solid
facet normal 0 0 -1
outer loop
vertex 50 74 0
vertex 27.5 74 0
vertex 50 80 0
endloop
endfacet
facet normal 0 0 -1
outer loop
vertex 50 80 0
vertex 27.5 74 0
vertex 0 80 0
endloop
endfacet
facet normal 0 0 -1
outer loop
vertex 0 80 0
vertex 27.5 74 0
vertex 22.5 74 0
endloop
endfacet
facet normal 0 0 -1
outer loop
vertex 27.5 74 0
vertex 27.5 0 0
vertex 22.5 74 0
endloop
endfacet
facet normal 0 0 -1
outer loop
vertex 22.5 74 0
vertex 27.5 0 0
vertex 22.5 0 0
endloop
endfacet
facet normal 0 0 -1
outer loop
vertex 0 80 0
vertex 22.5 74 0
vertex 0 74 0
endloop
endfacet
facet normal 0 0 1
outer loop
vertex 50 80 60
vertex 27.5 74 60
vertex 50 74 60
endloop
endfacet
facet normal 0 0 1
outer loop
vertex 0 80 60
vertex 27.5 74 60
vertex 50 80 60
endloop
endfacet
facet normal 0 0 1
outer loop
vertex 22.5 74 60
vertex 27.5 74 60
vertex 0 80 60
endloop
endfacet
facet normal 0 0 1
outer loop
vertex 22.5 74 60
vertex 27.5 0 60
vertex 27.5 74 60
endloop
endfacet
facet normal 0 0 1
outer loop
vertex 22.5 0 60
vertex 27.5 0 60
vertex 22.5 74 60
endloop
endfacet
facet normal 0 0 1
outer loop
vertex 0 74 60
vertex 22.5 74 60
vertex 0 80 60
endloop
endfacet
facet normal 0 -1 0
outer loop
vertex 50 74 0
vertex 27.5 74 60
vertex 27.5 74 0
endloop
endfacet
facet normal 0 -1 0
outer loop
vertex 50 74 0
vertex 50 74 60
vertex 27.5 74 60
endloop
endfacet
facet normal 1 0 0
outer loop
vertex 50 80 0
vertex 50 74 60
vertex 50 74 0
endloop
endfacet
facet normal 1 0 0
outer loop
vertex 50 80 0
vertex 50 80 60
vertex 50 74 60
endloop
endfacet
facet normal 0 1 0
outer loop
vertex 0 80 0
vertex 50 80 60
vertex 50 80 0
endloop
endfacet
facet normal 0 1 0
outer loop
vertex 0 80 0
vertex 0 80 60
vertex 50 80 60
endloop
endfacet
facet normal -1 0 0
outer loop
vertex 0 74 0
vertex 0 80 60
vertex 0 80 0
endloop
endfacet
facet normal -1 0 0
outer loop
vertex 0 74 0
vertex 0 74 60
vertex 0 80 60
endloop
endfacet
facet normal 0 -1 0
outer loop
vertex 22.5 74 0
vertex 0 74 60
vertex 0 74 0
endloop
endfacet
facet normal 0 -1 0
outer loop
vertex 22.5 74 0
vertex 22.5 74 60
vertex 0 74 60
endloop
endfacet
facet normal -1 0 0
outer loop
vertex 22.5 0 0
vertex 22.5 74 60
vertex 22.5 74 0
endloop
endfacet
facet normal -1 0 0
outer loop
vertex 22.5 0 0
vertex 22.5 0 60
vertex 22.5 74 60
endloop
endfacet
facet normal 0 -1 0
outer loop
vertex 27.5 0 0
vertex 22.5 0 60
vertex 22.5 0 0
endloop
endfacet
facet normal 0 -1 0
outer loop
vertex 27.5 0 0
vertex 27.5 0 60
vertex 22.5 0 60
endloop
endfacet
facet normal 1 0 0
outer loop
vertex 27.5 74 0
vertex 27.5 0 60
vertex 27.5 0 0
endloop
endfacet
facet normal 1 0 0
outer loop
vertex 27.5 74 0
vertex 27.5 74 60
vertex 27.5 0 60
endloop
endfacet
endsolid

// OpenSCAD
$fn = 32;

// ----------------------------------------------------------------------
// Structural section: tee 50 x 80 mm
// ----------------------------------------------------------------------

// --- parameters (mm) ---
sec_w = 50;               // tee width, X
sec_h = 80;               // tee height, Y
flange_t = 6;             // top flange thickness
web_t = 5;                // web thickness
plate_t = 60;             // cut length, Z (extrusion height)

profile = [[22.5, 0], [27.5, 0], [27.5, 74], [50, 74], [50, 80], [0, 80], [0, 74], [22.5, 74]];  // primary outline, 8 points, counter clockwise

// --- the one profile operation ---
linear_extrude(height = plate_t) polygon(points = profile);
